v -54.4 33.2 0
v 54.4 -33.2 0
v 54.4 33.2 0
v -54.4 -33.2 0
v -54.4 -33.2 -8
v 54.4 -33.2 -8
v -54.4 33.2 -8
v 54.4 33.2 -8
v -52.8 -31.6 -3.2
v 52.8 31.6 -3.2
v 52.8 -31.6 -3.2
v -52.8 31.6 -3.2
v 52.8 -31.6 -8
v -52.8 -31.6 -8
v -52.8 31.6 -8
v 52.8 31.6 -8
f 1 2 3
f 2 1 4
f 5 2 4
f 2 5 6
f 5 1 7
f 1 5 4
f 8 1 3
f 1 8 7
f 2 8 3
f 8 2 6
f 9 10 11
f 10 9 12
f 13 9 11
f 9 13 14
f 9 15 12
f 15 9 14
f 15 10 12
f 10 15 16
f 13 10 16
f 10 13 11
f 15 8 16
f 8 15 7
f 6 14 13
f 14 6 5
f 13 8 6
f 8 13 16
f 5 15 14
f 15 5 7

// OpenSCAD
// file: ../p/4-4edge.scad
use <../lib.scad>
$fa=1; $fs=0.2;
function ldraw_lib__4_4edge(realsolid=false) = [
// 0 Circle 1.0
// 0 Name: 4-4edge.dat
// 0 Author: James Jessiman
// 0 !LDRAW_ORG Primitive UPDATE 2017-01
// 0 !LICENSE Licensed under CC BY 2.0 and CC BY 4.0 : see CAreadme.txt
// 
// 0 BFC CERTIFY CCW
  [0,"BFC","CERTIFY"],
  [0,"BFC","CCW"],
// 
// 0 !HISTORY 1998-12-15 [PTadmin] Official Update 1998-10
// 0 !HISTORY 2005-12-28 [PTadmin] Official Update 2005-01
// 0 !HISTORY 2007-06-24 [PTadmin] Header formatted for Contributor Agreement
// 0 !HISTORY 2008-07-01 [PTadmin] Official Update 2008-01
// 0 !HISTORY 2017-01-15 [Steffen] BFCed
// 0 !HISTORY 2017-12-30 [PTadmin] Official Update 2017-01
// 
// 
// 2 24 1 0 0 0.9239 0 0.3827
  [2,24,1,0,0,0.9239,0,0.3827],
// 2 24 0.9239 0 0.3827 0.7071 0 0.7071
  [2,24,0.9239,0,0.3827,0.7071,0,0.7071],
// 2 24 0.7071 0 0.7071 0.3827 0 0.9239
  [2,24,0.7071,0,0.7071,0.3827,0,0.9239],
// 2 24 0.3827 0 0.9239 0 0 1
  [2,24,0.3827,0,0.9239,0,0,1],
// 2 24 0 0 1 -0.3827 0 0.9239
  [2,24,0,0,1,-0.3827,0,0.9239],
// 2 24 -0.3827 0 0.9239 -0.7071 0 0.7071
  [2,24,-0.3827,0,0.9239,-0.7071,0,0.7071],
// 2 24 -0.7071 0 0.7071 -0.9239 0 0.3827
  [2,24,-0.7071,0,0.7071,-0.9239,0,0.3827],
// 2 24 -0.9239 0 0.3827 -1 0 -0
  [2,24,-0.9239,0,0.3827,-1,0,-0],
// 2 24 -1 0 -0 -0.9239 0 -0.3827
  [2,24,-1,0,-0,-0.9239,0,-0.3827],
// 2 24 -0.9239 0 -0.3827 -0.7071 0 -0.7071
  [2,24,-0.9239,0,-0.3827,-0.7071,0,-0.7071],
// 2 24 -0.7071 0 -0.7071 -0.3827 0 -0.9239
  [2,24,-0.7071,0,-0.7071,-0.3827,0,-0.9239],
// 2 24 -0.3827 0 -0.9239 0 0 -1
  [2,24,-0.3827,0,-0.9239,0,0,-1],
// 2 24 0 0 -1 0.3827 0 -0.9239
  [2,24,0,0,-1,0.3827,0,-0.9239],
// 2 24 0.3827 0 -0.9239 0.7071 0 -0.7071
  [2,24,0.3827,0,-0.9239,0.7071,0,-0.7071],
// 2 24 0.7071 0 -0.7071 0.9239 0 -0.3827
  [2,24,0.7071,0,-0.7071,0.9239,0,-0.3827],
// 2 24 0.9239 0 -0.3827 1 0 0
  [2,24,0.9239,0,-0.3827,1,0,0],
];
module ldraw_lib__4_4edge(step=0, col=false, unit=2/5, alt=false, line=0.2, solid=!$preview)
    makepoly(ldraw_lib__4_4edge(solid), step=step, col=col, unit=unit, alt=alt, line=line, solid=solid);
ldraw_lib__4_4edge(line=0.2);
// file: ../p/4-4disc.scad
use <../lib.scad>
$fa=1; $fs=0.2;
function ldraw_lib__4_4disc(realsolid=false) = [
// 0 Disc 1.0
// 0 Name: 4-4disc.dat
// 0 Author: James Jessiman
// 0 !LDRAW_ORG Primitive UPDATE 2002-02
// 0 !LICENSE Licensed under CC BY 2.0 and CC BY 4.0 : see CAreadme.txt
// 
// 0 BFC CERTIFY CCW
  [0,"BFC","CERTIFY"],
  [0,"BFC","CCW"],
// 
// 0 !HISTORY 1998-12-15 [PTadmin] Official Update 1998-10
// 0 !HISTORY 2002-03-23 [sbliss] Added BFC statement
// 0 !HISTORY 2002-04-25 [PTadmin] Official Update 2002-02
// 0 !HISTORY 2007-06-24 [PTadmin] Header formatted for Contributor Agreement
// 0 !HISTORY 2008-07-01 [PTadmin] Official Update 2008-01
// 
// 
// 3 16 0 0 0 1 0 0 0.9239 0 0.3827
  [3,16,0,0,0,1,0,0,0.9239,0,0.3827],
// 3 16 0 0 0 0.9239 0 0.3827 0.7071 0 0.7071
  [3,16,0,0,0,0.9239,0,0.3827,0.7071,0,0.7071],
// 3 16 0 0 0 0.7071 0 0.7071 0.3827 0 0.9239
  [3,16,0,0,0,0.7071,0,0.7071,0.3827,0,0.9239],
// 3 16 0 0 0 0.3827 0 0.9239 0 0 1
  [3,16,0,0,0,0.3827,0,0.9239,0,0,1],
// 3 16 0 0 0 0 0 1 -0.3827 0 0.9239
  [3,16,0,0,0,0,0,1,-0.3827,0,0.9239],
// 3 16 0 0 0 -0.3827 0 0.9239 -0.7071 0 0.7071
  [3,16,0,0,0,-0.3827,0,0.9239,-0.7071,0,0.7071],
// 3 16 0 0 0 -0.7071 0 0.7071 -0.9239 0 0.3827
  [3,16,0,0,0,-0.7071,0,0.7071,-0.9239,0,0.3827],
// 3 16 0 0 0 -0.9239 0 0.3827 -1 0 -0
  [3,16,0,0,0,-0.9239,0,0.3827,-1,0,-0],
// 3 16 0 0 0 -1 0 -0 -0.9239 0 -0.3827
  [3,16,0,0,0,-1,0,-0,-0.9239,0,-0.3827],
// 3 16 0 0 0 -0.9239 0 -0.3827 -0.7071 0 -0.7071
  [3,16,0,0,0,-0.9239,0,-0.3827,-0.7071,0,-0.7071],
// 3 16 0 0 0 -0.7071 0 -0.7071 -0.3827 0 -0.9239
  [3,16,0,0,0,-0.7071,0,-0.7071,-0.3827,0,-0.9239],
// 3 16 0 0 0 -0.3827 0 -0.9239 0 0 -1
  [3,16,0,0,0,-0.3827,0,-0.9239,0,0,-1],
// 3 16 0 0 0 0 0 -1 0.3827 0 -0.9239
  [3,16,0,0,0,0,0,-1,0.3827,0,-0.9239],
// 3 16 0 0 0 0.3827 0 -0.9239 0.7071 0 -0.7071
  [3,16,0,0,0,0.3827,0,-0.9239,0.7071,0,-0.7071],
// 3 16 0 0 0 0.7071 0 -0.7071 0.9239 0 -0.3827
  [3,16,0,0,0,0.7071,0,-0.7071,0.9239,0,-0.3827],
// 3 16 0 0 0 0.9239 0 -0.3827 1 0 0
  [3,16,0,0,0,0.9239,0,-0.3827,1,0,0],
// 0
];
module ldraw_lib__4_4disc(step=0, col=false, unit=2/5, alt=false, line=0.2, solid=!$preview)
    makepoly(ldraw_lib__4_4disc(solid), step=step, col=col, unit=unit, alt=alt, line=line, solid=solid);
ldraw_lib__4_4disc(line=0.2);
// file: ../p/4-4cyli.scad
use <../lib.scad>
$fa=1; $fs=0.2;
function ldraw_lib__4_4cyli(realsolid=false) = [
// 0 Cylinder 1.0
// 0 Name: 4-4cyli.dat
// 0 Author: James Jessiman
// 0 !LDRAW_ORG Primitive UPDATE 2005-01
// 0 !LICENSE Licensed under CC BY 2.0 and CC BY 4.0 : see CAreadme.txt
// 
// 0 BFC CERTIFY CCW
  [0,"BFC","CERTIFY"],
  [0,"BFC","CCW"],
// 
// 0 !HISTORY 1998-12-15 [PTadmin] Official Update 1998-10
// 0 !HISTORY 2002-03-23 [sbliss] Added BFC statement; merged headers from files in distributions LDraw 0.27 and Complete.
// 0 !HISTORY 2002-04-25 [PTadmin] Official Update 2002-02
// 0 !HISTORY 2004-12-14 [guyvivan] BFC CCW
// 0 !HISTORY 2005-12-28 [PTadmin] Official Update 2005-01
// 0 !HISTORY 2007-06-24 [PTadmin] Header formatted for Contributor Agreement
// 0 !HISTORY 2008-07-01 [PTadmin] Official Update 2008-01
// 
// 
// 4 16 1 1 0 0.9239 1 0.3827 0.9239 0 0.3827 1 0 0
  [4,16,1,1,0,0.9239,1,0.3827,0.9239,0,0.3827,1,0,0],
// 5 24 1 0 0 1 1 0 0.9239 0 0.3827 0.9239 0 -0.3827
  [5,24,1,0,0,1,1,0,0.9239,0,0.3827,0.9239,0,-0.3827],
// 4 16 0.9239 1 0.3827 0.7071 1 0.7071 0.7071 0 0.7071 0.9239 0 0.3827
  [4,16,0.9239,1,0.3827,0.7071,1,0.7071,0.7071,0,0.7071,0.9239,0,0.3827],
// 5 24 0.9239 0 0.3827 0.9239 1 0.3827 0.7071 0 0.7071 1 0 0
  [5,24,0.9239,0,0.3827,0.9239,1,0.3827,0.7071,0,0.7071,1,0,0],
// 4 16 0.7071 1 0.7071 0.3827 1 0.9239 0.3827 0 0.9239 0.7071 0 0.7071
  [4,16,0.7071,1,0.7071,0.3827,1,0.9239,0.3827,0,0.9239,0.7071,0,0.7071],
// 5 24 0.7071 0 0.7071 0.7071 1 0.7071 0.3827 0 0.9239 0.9239 0 0.3827
  [5,24,0.7071,0,0.7071,0.7071,1,0.7071,0.3827,0,0.9239,0.9239,0,0.3827],
// 4 16 0.3827 1 0.9239 0 1 1 0 0 1 0.3827 0 0.9239
  [4,16,0.3827,1,0.9239,0,1,1,0,0,1,0.3827,0,0.9239],
// 5 24 0.3827 0 0.9239 0.3827 1 0.9239 0 0 1 0.7071 0 0.7071
  [5,24,0.3827,0,0.9239,0.3827,1,0.9239,0,0,1,0.7071,0,0.7071],
// 4 16 0 1 1 -0.3827 1 0.9239 -0.3827 0 0.9239 0 0 1
  [4,16,0,1,1,-0.3827,1,0.9239,-0.3827,0,0.9239,0,0,1],
// 5 24 0 0 1 0 1 1 -0.3827 0 0.9239 0.3827 0 0.9239
  [5,24,0,0,1,0,1,1,-0.3827,0,0.9239,0.3827,0,0.9239],
// 4 16 -0.3827 1 0.9239 -0.7071 1 0.7071 -0.7071 0 0.7071 -0.3827 0 0.9239
  [4,16,-0.3827,1,0.9239,-0.7071,1,0.7071,-0.7071,0,0.7071,-0.3827,0,0.9239],
// 5 24 -0.3827 0 0.9239 -0.3827 1 0.9239 -0.7071 0 0.7071 0 0 1
  [5,24,-0.3827,0,0.9239,-0.3827,1,0.9239,-0.7071,0,0.7071,0,0,1],
// 4 16 -0.7071 1 0.7071 -0.9239 1 0.3827 -0.9239 0 0.3827 -0.7071 0 0.7071
  [4,16,-0.7071,1,0.7071,-0.9239,1,0.3827,-0.9239,0,0.3827,-0.7071,0,0.7071],
// 5 24 -0.7071 0 0.7071 -0.7071 1 0.7071 -0.9239 0 0.3827 -0.3827 0 0.9239
  [5,24,-0.7071,0,0.7071,-0.7071,1,0.7071,-0.9239,0,0.3827,-0.3827,0,0.9239],
// 4 16 -0.9239 1 0.3827 -1 1 0 -1 0 0 -0.9239 0 0.3827
  [4,16,-0.9239,1,0.3827,-1,1,0,-1,0,0,-0.9239,0,0.3827],
// 5 24 -0.9239 0 0.3827 -0.9239 1 0.3827 -1 0 0 -0.7071 0 0.7071
  [5,24,-0.9239,0,0.3827,-0.9239,1,0.3827,-1,0,0,-0.7071,0,0.7071],
// 4 16 -1 1 0 -0.9239 1 -0.3827 -0.9239 0 -0.3827 -1 0 0
  [4,16,-1,1,0,-0.9239,1,-0.3827,-0.9239,0,-0.3827,-1,0,0],
// 5 24 -1 0 0 -1 1 0 -0.9239 0 -0.3827 -0.9239 0 0.3827
  [5,24,-1,0,0,-1,1,0,-0.9239,0,-0.3827,-0.9239,0,0.3827],
// 4 16 -0.9239 1 -0.3827 -0.7071 1 -0.7071 -0.7071 0 -0.7071 -0.9239 0 -0.3827
  [4,16,-0.9239,1,-0.3827,-0.7071,1,-0.7071,-0.7071,0,-0.7071,-0.9239,0,-0.3827],
// 5 24 -0.9239 0 -0.3827 -0.9239 1 -0.3827 -0.7071 0 -0.7071 -1 0 0
  [5,24,-0.9239,0,-0.3827,-0.9239,1,-0.3827,-0.7071,0,-0.7071,-1,0,0],
// 4 16 -0.7071 1 -0.7071 -0.3827 1 -0.9239 -0.3827 0 -0.9239 -0.7071 0 -0.7071
  [4,16,-0.7071,1,-0.7071,-0.3827,1,-0.9239,-0.3827,0,-0.9239,-0.7071,0,-0.7071],
// 5 24 -0.7071 0 -0.7071 -0.7071 1 -0.7071 -0.3827 0 -0.9239 -0.9239 0 -0.3827
  [5,24,-0.7071,0,-0.7071,-0.7071,1,-0.7071,-0.3827,0,-0.9239,-0.9239,0,-0.3827],
// 4 16 -0.3827 1 -0.9239 0 1 -1 0 0 -1 -0.3827 0 -0.9239
  [4,16,-0.3827,1,-0.9239,0,1,-1,0,0,-1,-0.3827,0,-0.9239],
// 5 24 -0.3827 0 -0.9239 -0.3827 1 -0.9239 0 0 -1 -0.7071 0 -0.7071
  [5,24,-0.3827,0,-0.9239,-0.3827,1,-0.9239,0,0,-1,-0.7071,0,-0.7071],
// 4 16 0 1 -1 0.3827 1 -0.9239 0.3827 0 -0.9239 0 0 -1
  [4,16,0,1,-1,0.3827,1,-0.9239,0.3827,0,-0.9239,0,0,-1],
// 5 24 0 0 -1 0 1 -1 0.3827 0 -0.9239 -0.3827 0 -0.9239
  [5,24,0,0,-1,0,1,-1,0.3827,0,-0.9239,-0.3827,0,-0.9239],
// 4 16 0.3827 1 -0.9239 0.7071 1 -0.7071 0.7071 0 -0.7071 0.3827 0 -0.9239
  [4,16,0.3827,1,-0.9239,0.7071,1,-0.7071,0.7071,0,-0.7071,0.3827,0,-0.9239],
// 5 24 0.3827 0 -0.9239 0.3827 1 -0.9239 0.7071 0 -0.7071 0 0 -1
  [5,24,0.3827,0,-0.9239,0.3827,1,-0.9239,0.7071,0,-0.7071,0,0,-1],
// 4 16 0.7071 1 -0.7071 0.9239 1 -0.3827 0.9239 0 -0.3827 0.7071 0 -0.7071
  [4,16,0.7071,1,-0.7071,0.9239,1,-0.3827,0.9239,0,-0.3827,0.7071,0,-0.7071],
// 5 24 0.7071 0 -0.7071 0.7071 1 -0.7071 0.9239 0 -0.3827 0.3827 0 -0.9239
  [5,24,0.7071,0,-0.7071,0.7071,1,-0.7071,0.9239,0,-0.3827,0.3827,0,-0.9239],
// 4 16 0.9239 1 -0.3827 1 1 0 1 0 0 0.9239 0 -0.3827
  [4,16,0.9239,1,-0.3827,1,1,0,1,0,0,0.9239,0,-0.3827],
// 5 24 0.9239 0 -0.3827 0.9239 1 -0.3827 1 0 0 0.7071 0 -0.7071
  [5,24,0.9239,0,-0.3827,0.9239,1,-0.3827,1,0,0,0.7071,0,-0.7071],
// 0
];
module ldraw_lib__4_4cyli(step=0, col=false, unit=2/5, alt=false, line=0.2, solid=!$preview)
    makepoly(ldraw_lib__4_4cyli(solid), step=step, col=col, unit=unit, alt=alt, line=line, solid=solid);
ldraw_lib__4_4cyli(line=0.2);
// file: ../p/stud3.scad
use <../lib.scad>
use <4-4cyli.scad>
use <4-4disc.scad>
use <4-4edge.scad>
$fa=1; $fs=0.2;
function ldraw_lib__stud3(realsolid=false) = realsolid ? 
    [openscad(translate([0,0,-eps()], o=cylinder(4+eps(), r=4)),2)] : [
// 0 Stud Tube Solid
// 0 Name: stud3.dat
// 0 Author: James Jessiman
// 0 !LDRAW_ORG Primitive UPDATE 2012-01
// 0 !LICENSE Licensed under CC BY 2.0 and CC BY 4.0 : see CAreadme.txt
// 
// 0 BFC CERTIFY CCW
  [0,"BFC","CERTIFY"],
  [0,"BFC","CCW"],
// 
// 0 !HISTORY 2002-04-04 [sbliss] Modified for BFC compliance
// 0 !HISTORY 2002-04-25 [PTadmin] Official Update 2002-02
// 0 !HISTORY 2007-06-24 [PTadmin] Header formatted for Contributor Agreement
// 0 !HISTORY 2008-07-01 [PTadmin] Official Update 2008-01
// 0 !HISTORY 2012-02-16 [Philo] Changed to CCW
// 0 !HISTORY 2012-03-30 [PTadmin] Official Update 2012-01
// 
// 
// 1 16 0 -4 0 4 0 0 0 1 0 0 0 4 4-4edge.dat
  [1,16,0,-4,0,4,0,0,0,1,0,0,0,4, ldraw_lib__4_4edge(realsolid)],
// 1 16 0 0 0 4 0 0 0 1 0 0 0 4 4-4edge.dat
  [1,16,0,0,0,4,0,0,0,1,0,0,0,4, ldraw_lib__4_4edge(realsolid)],
// 1 16 0 -4 0 4 0 0 0 1 0 0 0 4 4-4disc.dat
  [1,16,0,-4,0,4,0,0,0,1,0,0,0,4, ldraw_lib__4_4disc(realsolid)],
// 1 16 0 -4 0 4 0 0 0 4 0 0 0 4 4-4cyli.dat
  [1,16,0,-4,0,4,0,0,0,4,0,0,0,4, ldraw_lib__4_4cyli(realsolid)],
];
module ldraw_lib__stud3(step=0, col=false, unit=2/5, alt=false, line=0.2, solid=!$preview)
    makepoly(ldraw_lib__stud3(solid), step=step, col=col, unit=unit, alt=alt, line=line, solid=solid);
ldraw_lib__stud3(line=0.2);
// file: ../p/stud.scad
use <../lib.scad>
use <4-4cyli.scad>
use <4-4disc.scad>
use <4-4edge.scad>
$fa=1; $fs=0.2;
function ldraw_lib__stud(realsolid=false) = realsolid ? 
    [openscad(translate([0,0,-eps()], o=cylinder(4+eps(), r=6)),2)] : [
// 0 Stud
// 0 Name: stud.dat
// 0 Author: James Jessiman
// 0 !LDRAW_ORG Primitive UPDATE 2012-01
// 0 !LICENSE Licensed under CC BY 2.0 and CC BY 4.0 : see CAreadme.txt
// 
// 0 BFC CERTIFY CCW
  [0,"BFC","CERTIFY"],
  [0,"BFC","CCW"],
// 
// 0 !HISTORY 2002-04-04 [sbliss] Modified for BFC compliance
// 0 !HISTORY 2002-04-25 [PTadmin] Official Update 2002-02
// 0 !HISTORY 2007-06-24 [PTadmin] Header formatted for Contributor Agreement
// 0 !HISTORY 2008-07-01 [PTadmin] Official Update 2008-01
// 0 !HISTORY 2012-02-16 [Philo] Changed to CCW
// 0 !HISTORY 2012-03-30 [PTadmin] Official Update 2012-01
// 
// 
// 1 16 0 0 0 6 0 0 0 1 0 0 0 6 4-4edge.dat
  [1,16,0,0,0,6,0,0,0,1,0,0,0,6, ldraw_lib__4_4edge(realsolid)],
// 1 16 0 -4 0 6 0 0 0 1 0 0 0 6 4-4edge.dat
  [1,16,0,-4,0,6,0,0,0,1,0,0,0,6, ldraw_lib__4_4edge(realsolid)],
// 1 16 0 0 0 6 0 0 0 -4 0 0 0 6 4-4cyli.dat
  [1,16,0,0,0,6,0,0,0,-4,0,0,0,6, ldraw_lib__4_4cyli(realsolid)],
// 1 16 0 -4 0 6 0 0 0 1 0 0 0 6 4-4disc.dat
  [1,16,0,-4,0,6,0,0,0,1,0,0,0,6, ldraw_lib__4_4disc(realsolid)],
];
module ldraw_lib__stud(step=0, col=false, unit=2/5, alt=false, line=0.2, solid=!$preview)
    makepoly(ldraw_lib__stud(solid), step=step, col=col, unit=unit, alt=alt, line=line, solid=solid);
ldraw_lib__stud(line=0.2);
// file: ../p/box4t.scad
use <../lib.scad>
$fa=1; $fs=0.2;
function ldraw_lib__box4t(realsolid=false) = [
// 0 Box with 4 Adjacent Faces and All Edges
// 0 Name: box4t.dat
// 0 Author: Tore Eriksson [Tore_Eriksson]
// 0 !LDRAW_ORG Primitive UPDATE 2003-02
// 0 !LICENSE Licensed under CC BY 2.0 and CC BY 4.0 : see CAreadme.txt
// 
// 0 BFC CERTIFY CCW
  [0,"BFC","CERTIFY"],
  [0,"BFC","CCW"],
// 
// 0 !HISTORY 1997-09-29 [PTadmin] Official Update 1997-15
// 0 !HISTORY 2002-08-31 [izanette] Modified with WINDZ for BFC compliance
// 0 !HISTORY 2003-08-01 [PTadmin] Official Update 2003-02
// 0 !HISTORY 2007-06-24 [PTadmin] Header formatted for Contributor Agreement
// 0 !HISTORY 2008-07-01 [PTadmin] Official Update 2008-01
// 
// 
// 2 24 1 1 1 -1 1 1
  [2,24,1,1,1,-1,1,1],
// 2 24 -1 1 1 -1 1 -1
  [2,24,-1,1,1,-1,1,-1],
// 2 24 -1 1 -1 1 1 -1
  [2,24,-1,1,-1,1,1,-1],
// 2 24 1 1 -1 1 1 1
  [2,24,1,1,-1,1,1,1],
// 2 24 1 0 1 -1 0 1
  [2,24,1,0,1,-1,0,1],
// 2 24 -1 0 1 -1 0 -1
  [2,24,-1,0,1,-1,0,-1],
// 2 24 -1 0 -1 1 0 -1
  [2,24,-1,0,-1,1,0,-1],
// 2 24 1 0 -1 1 0 1
  [2,24,1,0,-1,1,0,1],
// 2 24 1 0 1 1 1 1
  [2,24,1,0,1,1,1,1],
// 2 24 -1 0 1 -1 1 1
  [2,24,-1,0,1,-1,1,1],
// 2 24 1 0 -1 1 1 -1
  [2,24,1,0,-1,1,1,-1],
// 2 24 -1 0 -1 -1 1 -1
  [2,24,-1,0,-1,-1,1,-1],
// 4 16 1 1 1 1 1 -1 -1 1 -1 -1 1 1
  [4,16,1,1,1,1,1,-1,-1,1,-1,-1,1,1],
// 4 16 1 1 1 -1 1 1 -1 0 1 1 0 1
  [4,16,1,1,1,-1,1,1,-1,0,1,1,0,1],
// 4 16 -1 1 1 -1 1 -1 -1 0 -1 -1 0 1
  [4,16,-1,1,1,-1,1,-1,-1,0,-1,-1,0,1],
// 0 4 16 -1 1 -1 -1 0 -1 1 0 -1 1 1 -1
// 4 16 1 1 -1 1 1 1 1 0 1 1 0 -1
  [4,16,1,1,-1,1,1,1,1,0,1,1,0,-1],
// 0
];
module ldraw_lib__box4t(step=0, col=false, unit=2/5, alt=false, line=0.2, solid=!$preview)
    makepoly(ldraw_lib__box4t(solid), step=step, col=col, unit=unit, alt=alt, line=line, solid=solid);
ldraw_lib__box4t(line=0.2);
// file: s/3004s01.scad
use <../../lib.scad>
use <../../p/box4t.scad>
use <../../p/box5.scad>
use <../../p/stud.scad>
use <../../p/stud3.scad>
$fa=1; $fs=0.2;
function ldraw_lib__s__3004s01(realsolid=false) = [
// 0 ~Brick  1 x  2 without Front Face
// 0 Name: s\3004s01.dat
// 0 Author: James Jessiman
// 0 !LDRAW_ORG Subpart UPDATE 2003-03
// 0 !LICENSE Licensed under CC BY 2.0 and CC BY 4.0 : see CAreadme.txt
// 
// 0 BFC CERTIFY CCW
  [0,"BFC","CERTIFY"],
  [0,"BFC","CCW"],
// 
// 0 !HISTORY 2003-09-07 [jriley] Subfiling, BFC
// 0 !HISTORY 2003-12-19 [PTadmin] Official Update 2003-03
// 0 !HISTORY 2007-08-29 [PTadmin] Header formatted for Contributor Agreement
// 0 !HISTORY 2008-07-01 [PTadmin] Official Update 2008-01
// 
// 
// 1 16 0 4 0 1 0 0 0 -5 0 0 0 1 stud3.dat
  [1,16,0,4,0,1,0,0,0,-5,0,0,0,1, ldraw_lib__stud3(realsolid)],
// 0 BFC INVERTNEXT
  [0,"BFC","INVERTNEXT"],
// 1 16 0 24 0 16 0 0 0 -20 0 0 0 6 box5.dat
  [1,16,0,24,0,16,0,0,0,-20,0,0,0,6, ldraw_lib__box5(realsolid)],
// 4 16 20 24 10 16 24 6 -16 24 6 -20 24 10
  [4,16,20,24,10,16,24,6,-16,24,6,-20,24,10],
// 4 16 -20 24 10 -16 24 6 -16 24 -6 -20 24 -10
  [4,16,-20,24,10,-16,24,6,-16,24,-6,-20,24,-10],
// 4 16 -20 24 -10 -16 24 -6 16 24 -6 20 24 -10
  [4,16,-20,24,-10,-16,24,-6,16,24,-6,20,24,-10],
// 4 16 20 24 -10 16 24 -6 16 24 6 20 24 10
  [4,16,20,24,-10,16,24,-6,16,24,6,20,24,10],
// 1 16 0 24 0 20 0 0 0 -24 0 0 0 10 box4t.dat
  [1,16,0,24,0,20,0,0,0,-24,0,0,0,10, ldraw_lib__box4t(realsolid)],
// 1 16 10 0 0 1 0 0 0 1 0 0 0 1 stud.dat
  [1,16,10,0,0,1,0,0,0,1,0,0,0,1, ldraw_lib__stud(realsolid)],
// 1 16 -10 0 0 1 0 0 0 1 0 0 0 1 stud.dat
  [1,16,-10,0,0,1,0,0,0,1,0,0,0,1, ldraw_lib__stud(realsolid)],
// 0
];
module ldraw_lib__s__3004s01(step=0, col=false, unit=2/5, alt=false, line=0.2, solid=!$preview)
    makepoly(ldraw_lib__s__3004s01(solid), step=step, col=col, unit=unit, alt=alt, line=line, solid=solid);
ldraw_lib__s__3004s01(line=0.2);
// file: 3004.scad
use <../lib.scad>
use <s/3004s01.scad>
$fa=1; $fs=0.2;
function ldraw_lib__3004(realsolid=false) = [
// 0 Brick  1 x  2
// 0 Name: 3004.dat
// 0 Author: James Jessiman
// 0 !LDRAW_ORG Part UPDATE 2022-05
// 0 !LICENSE Licensed under CC BY 2.0 and CC BY 4.0 : see CAreadme.txt
// 
// 0 BFC CERTIFY CCW
  [0,"BFC","CERTIFY"],
  [0,"BFC","CCW"],
// 
// 0 !HISTORY 2001-10-26 [PTadmin] Official Update 2001-01
// 0 !HISTORY 2002-05-07 {unknown} BFC Certification
// 0 !HISTORY 2002-06-11 [PTadmin] Official Update 2002-03
// 0 !HISTORY 2007-05-07 [PTadmin] Header formatted for Contributor Agreement
// 0 !HISTORY 2008-07-01 [PTadmin] Official Update 2008-01
// 0 !HISTORY 2022-08-04 [MagFors] Using subfile
// 0 !HISTORY 2022-09-15 [PTadmin] Official Update 2022-05
// 
// 
// 1 16 0 0 0 1 0 0 0 1 0 0 0 1 s\3004s01.dat
  [1,16,0,0,0,1,0,0,0,1,0,0,0,1, ldraw_lib__s__3004s01(realsolid)],
// 4 16 -20 24 -10 20 24 -10 20 0 -10 -20 0 -10
  [4,16,-20,24,-10,20,24,-10,20,0,-10,-20,0,-10],
];
module ldraw_lib__3004(step=0, col=false, unit=2/5, alt=false, line=0.2, solid=!$preview)
    makepoly(ldraw_lib__3004(solid), step=step, col=col, unit=unit, alt=alt, line=line, solid=solid);
ldraw_lib__3004(line=0.2);
// file: ../p/box5.scad
use <../lib.scad>
$fa=1; $fs=0.2;
function ldraw_lib__box5(realsolid=false) = [
// 0 Box with 5 Faces and All Edges
// 0 Name: box5.dat
// 0 Author: James Jessiman
// 0 !LDRAW_ORG Primitive UPDATE 2012-01
// 0 !LICENSE Licensed under CC BY 2.0 and CC BY 4.0 : see CAreadme.txt
// 
// 0 BFC CERTIFY CCW
  [0,"BFC","CERTIFY"],
  [0,"BFC","CCW"],
// 
// 0 !HISTORY 2002-04-03 [sbliss] Modified for BFC compliance
// 0 !HISTORY 2002-04-25 [PTadmin] Official Update 2002-02
// 0 !HISTORY 2007-06-24 [PTadmin] Header formatted for Contributor Agreement
// 0 !HISTORY 2008-07-01 [PTadmin] Official Update 2008-01
// 0 !HISTORY 2012-02-16 [Philo] Changed to CCW
// 0 !HISTORY 2012-03-30 [PTadmin] Official Update 2012-01
// 
// 
// 2 24 1 1 1 -1 1 1
  [2,24,1,1,1,-1,1,1],
// 2 24 -1 1 1 -1 1 -1
  [2,24,-1,1,1,-1,1,-1],
// 2 24 -1 1 -1 1 1 -1
  [2,24,-1,1,-1,1,1,-1],
// 2 24 1 1 -1 1 1 1
  [2,24,1,1,-1,1,1,1],
// 2 24 1 0 1 -1 0 1
  [2,24,1,0,1,-1,0,1],
// 2 24 -1 0 1 -1 0 -1
  [2,24,-1,0,1,-1,0,-1],
// 2 24 -1 0 -1 1 0 -1
  [2,24,-1,0,-1,1,0,-1],
// 2 24 1 0 -1 1 0 1
  [2,24,1,0,-1,1,0,1],
// 2 24 1 0 1 1 1 1
  [2,24,1,0,1,1,1,1],
// 2 24 -1 0 1 -1 1 1
  [2,24,-1,0,1,-1,1,1],
// 2 24 1 0 -1 1 1 -1
  [2,24,1,0,-1,1,1,-1],
// 2 24 -1 0 -1 -1 1 -1
  [2,24,-1,0,-1,-1,1,-1],
// 4 16 -1 1 1 1 1 1 1 1 -1 -1 1 -1
  [4,16,-1,1,1,1,1,1,1,1,-1,-1,1,-1],
// 4 16 -1 1 1 -1 0 1 1 0 1 1 1 1
  [4,16,-1,1,1,-1,0,1,1,0,1,1,1,1],
// 4 16 -1 1 -1 -1 0 -1 -1 0 1 -1 1 1
  [4,16,-1,1,-1,-1,0,-1,-1,0,1,-1,1,1],
// 4 16 1 1 -1 1 0 -1 -1 0 -1 -1 1 -1
  [4,16,1,1,-1,1,0,-1,-1,0,-1,-1,1,-1],
// 4 16 1 1 1 1 0 1 1 0 -1 1 1 -1
  [4,16,1,1,1,1,0,1,1,0,-1,1,1,-1],
];
module ldraw_lib__box5(step=0, col=false, unit=2/5, alt=false, line=0.2, solid=!$preview)
    makepoly(ldraw_lib__box5(solid), step=step, col=col, unit=unit, alt=alt, line=line, solid=solid);
ldraw_lib__box5(line=0.2);
// main file
use <../lib.scad>
use <../p/box5.scad>
$fa=1; $fs=0.2;
function ldraw_lib__32340(realsolid=false) = [
// 0 ~Electric Technic Solar Panel Top
// 0 Name: 32340.dat
// 0 Author: Philippe Hurbain [Philo]
// 0 !LDRAW_ORG Part UPDATE 2012-01
// 0 !LICENSE Licensed under CC BY 2.0 and CC BY 4.0 : see CAreadme.txt
// 
// 0 BFC CERTIFY CCW
  [0,"BFC","CERTIFY"],
  [0,"BFC","CCW"],
// 
// 0 !HISTORY 2012-03-30 [PTadmin] Official Update 2012-01
// 
// 
// 1 16 0 20 0 136 0 0 0 -20 0 0 0 -83 box5.dat
  [1,16,0,20,0,136,0,0,0,-20,0,0,0,-83, ldraw_lib__box5(realsolid)],
// 0 BFC INVERTNEXT
  [0,"BFC","INVERTNEXT"],
// 1 16 0 20 0 132 0 0 0 -12 0 0 0 -79 box5.dat
  [1,16,0,20,0,132,0,0,0,-12,0,0,0,-79, ldraw_lib__box5(realsolid)],
// 4 16 136 20 83 132 20 79 -132 20 79 -136 20 83
  [4,16,136,20,83,132,20,79,-132,20,79,-136,20,83],
// 4 16 -136 20 -83 -132 20 -79 132 20 -79 136 20 -83
  [4,16,-136,20,-83,-132,20,-79,132,20,-79,136,20,-83],
// 4 16 136 20 -83 132 20 -79 132 20 79 136 20 83
  [4,16,136,20,-83,132,20,-79,132,20,79,136,20,83],
// 4 16 -136 20 83 -132 20 79 -132 20 -79 -136 20 -83
  [4,16,-136,20,83,-132,20,79,-132,20,-79,-136,20,-83],
];
module ldraw_lib__32340(step=0, col=false, unit=2/5, alt=false, line=0.2, solid=!$preview)
    makepoly(ldraw_lib__32340(solid), step=step, col=col, unit=unit, alt=alt, line=line, solid=solid);
ldraw_lib__32340(line=0.2);
